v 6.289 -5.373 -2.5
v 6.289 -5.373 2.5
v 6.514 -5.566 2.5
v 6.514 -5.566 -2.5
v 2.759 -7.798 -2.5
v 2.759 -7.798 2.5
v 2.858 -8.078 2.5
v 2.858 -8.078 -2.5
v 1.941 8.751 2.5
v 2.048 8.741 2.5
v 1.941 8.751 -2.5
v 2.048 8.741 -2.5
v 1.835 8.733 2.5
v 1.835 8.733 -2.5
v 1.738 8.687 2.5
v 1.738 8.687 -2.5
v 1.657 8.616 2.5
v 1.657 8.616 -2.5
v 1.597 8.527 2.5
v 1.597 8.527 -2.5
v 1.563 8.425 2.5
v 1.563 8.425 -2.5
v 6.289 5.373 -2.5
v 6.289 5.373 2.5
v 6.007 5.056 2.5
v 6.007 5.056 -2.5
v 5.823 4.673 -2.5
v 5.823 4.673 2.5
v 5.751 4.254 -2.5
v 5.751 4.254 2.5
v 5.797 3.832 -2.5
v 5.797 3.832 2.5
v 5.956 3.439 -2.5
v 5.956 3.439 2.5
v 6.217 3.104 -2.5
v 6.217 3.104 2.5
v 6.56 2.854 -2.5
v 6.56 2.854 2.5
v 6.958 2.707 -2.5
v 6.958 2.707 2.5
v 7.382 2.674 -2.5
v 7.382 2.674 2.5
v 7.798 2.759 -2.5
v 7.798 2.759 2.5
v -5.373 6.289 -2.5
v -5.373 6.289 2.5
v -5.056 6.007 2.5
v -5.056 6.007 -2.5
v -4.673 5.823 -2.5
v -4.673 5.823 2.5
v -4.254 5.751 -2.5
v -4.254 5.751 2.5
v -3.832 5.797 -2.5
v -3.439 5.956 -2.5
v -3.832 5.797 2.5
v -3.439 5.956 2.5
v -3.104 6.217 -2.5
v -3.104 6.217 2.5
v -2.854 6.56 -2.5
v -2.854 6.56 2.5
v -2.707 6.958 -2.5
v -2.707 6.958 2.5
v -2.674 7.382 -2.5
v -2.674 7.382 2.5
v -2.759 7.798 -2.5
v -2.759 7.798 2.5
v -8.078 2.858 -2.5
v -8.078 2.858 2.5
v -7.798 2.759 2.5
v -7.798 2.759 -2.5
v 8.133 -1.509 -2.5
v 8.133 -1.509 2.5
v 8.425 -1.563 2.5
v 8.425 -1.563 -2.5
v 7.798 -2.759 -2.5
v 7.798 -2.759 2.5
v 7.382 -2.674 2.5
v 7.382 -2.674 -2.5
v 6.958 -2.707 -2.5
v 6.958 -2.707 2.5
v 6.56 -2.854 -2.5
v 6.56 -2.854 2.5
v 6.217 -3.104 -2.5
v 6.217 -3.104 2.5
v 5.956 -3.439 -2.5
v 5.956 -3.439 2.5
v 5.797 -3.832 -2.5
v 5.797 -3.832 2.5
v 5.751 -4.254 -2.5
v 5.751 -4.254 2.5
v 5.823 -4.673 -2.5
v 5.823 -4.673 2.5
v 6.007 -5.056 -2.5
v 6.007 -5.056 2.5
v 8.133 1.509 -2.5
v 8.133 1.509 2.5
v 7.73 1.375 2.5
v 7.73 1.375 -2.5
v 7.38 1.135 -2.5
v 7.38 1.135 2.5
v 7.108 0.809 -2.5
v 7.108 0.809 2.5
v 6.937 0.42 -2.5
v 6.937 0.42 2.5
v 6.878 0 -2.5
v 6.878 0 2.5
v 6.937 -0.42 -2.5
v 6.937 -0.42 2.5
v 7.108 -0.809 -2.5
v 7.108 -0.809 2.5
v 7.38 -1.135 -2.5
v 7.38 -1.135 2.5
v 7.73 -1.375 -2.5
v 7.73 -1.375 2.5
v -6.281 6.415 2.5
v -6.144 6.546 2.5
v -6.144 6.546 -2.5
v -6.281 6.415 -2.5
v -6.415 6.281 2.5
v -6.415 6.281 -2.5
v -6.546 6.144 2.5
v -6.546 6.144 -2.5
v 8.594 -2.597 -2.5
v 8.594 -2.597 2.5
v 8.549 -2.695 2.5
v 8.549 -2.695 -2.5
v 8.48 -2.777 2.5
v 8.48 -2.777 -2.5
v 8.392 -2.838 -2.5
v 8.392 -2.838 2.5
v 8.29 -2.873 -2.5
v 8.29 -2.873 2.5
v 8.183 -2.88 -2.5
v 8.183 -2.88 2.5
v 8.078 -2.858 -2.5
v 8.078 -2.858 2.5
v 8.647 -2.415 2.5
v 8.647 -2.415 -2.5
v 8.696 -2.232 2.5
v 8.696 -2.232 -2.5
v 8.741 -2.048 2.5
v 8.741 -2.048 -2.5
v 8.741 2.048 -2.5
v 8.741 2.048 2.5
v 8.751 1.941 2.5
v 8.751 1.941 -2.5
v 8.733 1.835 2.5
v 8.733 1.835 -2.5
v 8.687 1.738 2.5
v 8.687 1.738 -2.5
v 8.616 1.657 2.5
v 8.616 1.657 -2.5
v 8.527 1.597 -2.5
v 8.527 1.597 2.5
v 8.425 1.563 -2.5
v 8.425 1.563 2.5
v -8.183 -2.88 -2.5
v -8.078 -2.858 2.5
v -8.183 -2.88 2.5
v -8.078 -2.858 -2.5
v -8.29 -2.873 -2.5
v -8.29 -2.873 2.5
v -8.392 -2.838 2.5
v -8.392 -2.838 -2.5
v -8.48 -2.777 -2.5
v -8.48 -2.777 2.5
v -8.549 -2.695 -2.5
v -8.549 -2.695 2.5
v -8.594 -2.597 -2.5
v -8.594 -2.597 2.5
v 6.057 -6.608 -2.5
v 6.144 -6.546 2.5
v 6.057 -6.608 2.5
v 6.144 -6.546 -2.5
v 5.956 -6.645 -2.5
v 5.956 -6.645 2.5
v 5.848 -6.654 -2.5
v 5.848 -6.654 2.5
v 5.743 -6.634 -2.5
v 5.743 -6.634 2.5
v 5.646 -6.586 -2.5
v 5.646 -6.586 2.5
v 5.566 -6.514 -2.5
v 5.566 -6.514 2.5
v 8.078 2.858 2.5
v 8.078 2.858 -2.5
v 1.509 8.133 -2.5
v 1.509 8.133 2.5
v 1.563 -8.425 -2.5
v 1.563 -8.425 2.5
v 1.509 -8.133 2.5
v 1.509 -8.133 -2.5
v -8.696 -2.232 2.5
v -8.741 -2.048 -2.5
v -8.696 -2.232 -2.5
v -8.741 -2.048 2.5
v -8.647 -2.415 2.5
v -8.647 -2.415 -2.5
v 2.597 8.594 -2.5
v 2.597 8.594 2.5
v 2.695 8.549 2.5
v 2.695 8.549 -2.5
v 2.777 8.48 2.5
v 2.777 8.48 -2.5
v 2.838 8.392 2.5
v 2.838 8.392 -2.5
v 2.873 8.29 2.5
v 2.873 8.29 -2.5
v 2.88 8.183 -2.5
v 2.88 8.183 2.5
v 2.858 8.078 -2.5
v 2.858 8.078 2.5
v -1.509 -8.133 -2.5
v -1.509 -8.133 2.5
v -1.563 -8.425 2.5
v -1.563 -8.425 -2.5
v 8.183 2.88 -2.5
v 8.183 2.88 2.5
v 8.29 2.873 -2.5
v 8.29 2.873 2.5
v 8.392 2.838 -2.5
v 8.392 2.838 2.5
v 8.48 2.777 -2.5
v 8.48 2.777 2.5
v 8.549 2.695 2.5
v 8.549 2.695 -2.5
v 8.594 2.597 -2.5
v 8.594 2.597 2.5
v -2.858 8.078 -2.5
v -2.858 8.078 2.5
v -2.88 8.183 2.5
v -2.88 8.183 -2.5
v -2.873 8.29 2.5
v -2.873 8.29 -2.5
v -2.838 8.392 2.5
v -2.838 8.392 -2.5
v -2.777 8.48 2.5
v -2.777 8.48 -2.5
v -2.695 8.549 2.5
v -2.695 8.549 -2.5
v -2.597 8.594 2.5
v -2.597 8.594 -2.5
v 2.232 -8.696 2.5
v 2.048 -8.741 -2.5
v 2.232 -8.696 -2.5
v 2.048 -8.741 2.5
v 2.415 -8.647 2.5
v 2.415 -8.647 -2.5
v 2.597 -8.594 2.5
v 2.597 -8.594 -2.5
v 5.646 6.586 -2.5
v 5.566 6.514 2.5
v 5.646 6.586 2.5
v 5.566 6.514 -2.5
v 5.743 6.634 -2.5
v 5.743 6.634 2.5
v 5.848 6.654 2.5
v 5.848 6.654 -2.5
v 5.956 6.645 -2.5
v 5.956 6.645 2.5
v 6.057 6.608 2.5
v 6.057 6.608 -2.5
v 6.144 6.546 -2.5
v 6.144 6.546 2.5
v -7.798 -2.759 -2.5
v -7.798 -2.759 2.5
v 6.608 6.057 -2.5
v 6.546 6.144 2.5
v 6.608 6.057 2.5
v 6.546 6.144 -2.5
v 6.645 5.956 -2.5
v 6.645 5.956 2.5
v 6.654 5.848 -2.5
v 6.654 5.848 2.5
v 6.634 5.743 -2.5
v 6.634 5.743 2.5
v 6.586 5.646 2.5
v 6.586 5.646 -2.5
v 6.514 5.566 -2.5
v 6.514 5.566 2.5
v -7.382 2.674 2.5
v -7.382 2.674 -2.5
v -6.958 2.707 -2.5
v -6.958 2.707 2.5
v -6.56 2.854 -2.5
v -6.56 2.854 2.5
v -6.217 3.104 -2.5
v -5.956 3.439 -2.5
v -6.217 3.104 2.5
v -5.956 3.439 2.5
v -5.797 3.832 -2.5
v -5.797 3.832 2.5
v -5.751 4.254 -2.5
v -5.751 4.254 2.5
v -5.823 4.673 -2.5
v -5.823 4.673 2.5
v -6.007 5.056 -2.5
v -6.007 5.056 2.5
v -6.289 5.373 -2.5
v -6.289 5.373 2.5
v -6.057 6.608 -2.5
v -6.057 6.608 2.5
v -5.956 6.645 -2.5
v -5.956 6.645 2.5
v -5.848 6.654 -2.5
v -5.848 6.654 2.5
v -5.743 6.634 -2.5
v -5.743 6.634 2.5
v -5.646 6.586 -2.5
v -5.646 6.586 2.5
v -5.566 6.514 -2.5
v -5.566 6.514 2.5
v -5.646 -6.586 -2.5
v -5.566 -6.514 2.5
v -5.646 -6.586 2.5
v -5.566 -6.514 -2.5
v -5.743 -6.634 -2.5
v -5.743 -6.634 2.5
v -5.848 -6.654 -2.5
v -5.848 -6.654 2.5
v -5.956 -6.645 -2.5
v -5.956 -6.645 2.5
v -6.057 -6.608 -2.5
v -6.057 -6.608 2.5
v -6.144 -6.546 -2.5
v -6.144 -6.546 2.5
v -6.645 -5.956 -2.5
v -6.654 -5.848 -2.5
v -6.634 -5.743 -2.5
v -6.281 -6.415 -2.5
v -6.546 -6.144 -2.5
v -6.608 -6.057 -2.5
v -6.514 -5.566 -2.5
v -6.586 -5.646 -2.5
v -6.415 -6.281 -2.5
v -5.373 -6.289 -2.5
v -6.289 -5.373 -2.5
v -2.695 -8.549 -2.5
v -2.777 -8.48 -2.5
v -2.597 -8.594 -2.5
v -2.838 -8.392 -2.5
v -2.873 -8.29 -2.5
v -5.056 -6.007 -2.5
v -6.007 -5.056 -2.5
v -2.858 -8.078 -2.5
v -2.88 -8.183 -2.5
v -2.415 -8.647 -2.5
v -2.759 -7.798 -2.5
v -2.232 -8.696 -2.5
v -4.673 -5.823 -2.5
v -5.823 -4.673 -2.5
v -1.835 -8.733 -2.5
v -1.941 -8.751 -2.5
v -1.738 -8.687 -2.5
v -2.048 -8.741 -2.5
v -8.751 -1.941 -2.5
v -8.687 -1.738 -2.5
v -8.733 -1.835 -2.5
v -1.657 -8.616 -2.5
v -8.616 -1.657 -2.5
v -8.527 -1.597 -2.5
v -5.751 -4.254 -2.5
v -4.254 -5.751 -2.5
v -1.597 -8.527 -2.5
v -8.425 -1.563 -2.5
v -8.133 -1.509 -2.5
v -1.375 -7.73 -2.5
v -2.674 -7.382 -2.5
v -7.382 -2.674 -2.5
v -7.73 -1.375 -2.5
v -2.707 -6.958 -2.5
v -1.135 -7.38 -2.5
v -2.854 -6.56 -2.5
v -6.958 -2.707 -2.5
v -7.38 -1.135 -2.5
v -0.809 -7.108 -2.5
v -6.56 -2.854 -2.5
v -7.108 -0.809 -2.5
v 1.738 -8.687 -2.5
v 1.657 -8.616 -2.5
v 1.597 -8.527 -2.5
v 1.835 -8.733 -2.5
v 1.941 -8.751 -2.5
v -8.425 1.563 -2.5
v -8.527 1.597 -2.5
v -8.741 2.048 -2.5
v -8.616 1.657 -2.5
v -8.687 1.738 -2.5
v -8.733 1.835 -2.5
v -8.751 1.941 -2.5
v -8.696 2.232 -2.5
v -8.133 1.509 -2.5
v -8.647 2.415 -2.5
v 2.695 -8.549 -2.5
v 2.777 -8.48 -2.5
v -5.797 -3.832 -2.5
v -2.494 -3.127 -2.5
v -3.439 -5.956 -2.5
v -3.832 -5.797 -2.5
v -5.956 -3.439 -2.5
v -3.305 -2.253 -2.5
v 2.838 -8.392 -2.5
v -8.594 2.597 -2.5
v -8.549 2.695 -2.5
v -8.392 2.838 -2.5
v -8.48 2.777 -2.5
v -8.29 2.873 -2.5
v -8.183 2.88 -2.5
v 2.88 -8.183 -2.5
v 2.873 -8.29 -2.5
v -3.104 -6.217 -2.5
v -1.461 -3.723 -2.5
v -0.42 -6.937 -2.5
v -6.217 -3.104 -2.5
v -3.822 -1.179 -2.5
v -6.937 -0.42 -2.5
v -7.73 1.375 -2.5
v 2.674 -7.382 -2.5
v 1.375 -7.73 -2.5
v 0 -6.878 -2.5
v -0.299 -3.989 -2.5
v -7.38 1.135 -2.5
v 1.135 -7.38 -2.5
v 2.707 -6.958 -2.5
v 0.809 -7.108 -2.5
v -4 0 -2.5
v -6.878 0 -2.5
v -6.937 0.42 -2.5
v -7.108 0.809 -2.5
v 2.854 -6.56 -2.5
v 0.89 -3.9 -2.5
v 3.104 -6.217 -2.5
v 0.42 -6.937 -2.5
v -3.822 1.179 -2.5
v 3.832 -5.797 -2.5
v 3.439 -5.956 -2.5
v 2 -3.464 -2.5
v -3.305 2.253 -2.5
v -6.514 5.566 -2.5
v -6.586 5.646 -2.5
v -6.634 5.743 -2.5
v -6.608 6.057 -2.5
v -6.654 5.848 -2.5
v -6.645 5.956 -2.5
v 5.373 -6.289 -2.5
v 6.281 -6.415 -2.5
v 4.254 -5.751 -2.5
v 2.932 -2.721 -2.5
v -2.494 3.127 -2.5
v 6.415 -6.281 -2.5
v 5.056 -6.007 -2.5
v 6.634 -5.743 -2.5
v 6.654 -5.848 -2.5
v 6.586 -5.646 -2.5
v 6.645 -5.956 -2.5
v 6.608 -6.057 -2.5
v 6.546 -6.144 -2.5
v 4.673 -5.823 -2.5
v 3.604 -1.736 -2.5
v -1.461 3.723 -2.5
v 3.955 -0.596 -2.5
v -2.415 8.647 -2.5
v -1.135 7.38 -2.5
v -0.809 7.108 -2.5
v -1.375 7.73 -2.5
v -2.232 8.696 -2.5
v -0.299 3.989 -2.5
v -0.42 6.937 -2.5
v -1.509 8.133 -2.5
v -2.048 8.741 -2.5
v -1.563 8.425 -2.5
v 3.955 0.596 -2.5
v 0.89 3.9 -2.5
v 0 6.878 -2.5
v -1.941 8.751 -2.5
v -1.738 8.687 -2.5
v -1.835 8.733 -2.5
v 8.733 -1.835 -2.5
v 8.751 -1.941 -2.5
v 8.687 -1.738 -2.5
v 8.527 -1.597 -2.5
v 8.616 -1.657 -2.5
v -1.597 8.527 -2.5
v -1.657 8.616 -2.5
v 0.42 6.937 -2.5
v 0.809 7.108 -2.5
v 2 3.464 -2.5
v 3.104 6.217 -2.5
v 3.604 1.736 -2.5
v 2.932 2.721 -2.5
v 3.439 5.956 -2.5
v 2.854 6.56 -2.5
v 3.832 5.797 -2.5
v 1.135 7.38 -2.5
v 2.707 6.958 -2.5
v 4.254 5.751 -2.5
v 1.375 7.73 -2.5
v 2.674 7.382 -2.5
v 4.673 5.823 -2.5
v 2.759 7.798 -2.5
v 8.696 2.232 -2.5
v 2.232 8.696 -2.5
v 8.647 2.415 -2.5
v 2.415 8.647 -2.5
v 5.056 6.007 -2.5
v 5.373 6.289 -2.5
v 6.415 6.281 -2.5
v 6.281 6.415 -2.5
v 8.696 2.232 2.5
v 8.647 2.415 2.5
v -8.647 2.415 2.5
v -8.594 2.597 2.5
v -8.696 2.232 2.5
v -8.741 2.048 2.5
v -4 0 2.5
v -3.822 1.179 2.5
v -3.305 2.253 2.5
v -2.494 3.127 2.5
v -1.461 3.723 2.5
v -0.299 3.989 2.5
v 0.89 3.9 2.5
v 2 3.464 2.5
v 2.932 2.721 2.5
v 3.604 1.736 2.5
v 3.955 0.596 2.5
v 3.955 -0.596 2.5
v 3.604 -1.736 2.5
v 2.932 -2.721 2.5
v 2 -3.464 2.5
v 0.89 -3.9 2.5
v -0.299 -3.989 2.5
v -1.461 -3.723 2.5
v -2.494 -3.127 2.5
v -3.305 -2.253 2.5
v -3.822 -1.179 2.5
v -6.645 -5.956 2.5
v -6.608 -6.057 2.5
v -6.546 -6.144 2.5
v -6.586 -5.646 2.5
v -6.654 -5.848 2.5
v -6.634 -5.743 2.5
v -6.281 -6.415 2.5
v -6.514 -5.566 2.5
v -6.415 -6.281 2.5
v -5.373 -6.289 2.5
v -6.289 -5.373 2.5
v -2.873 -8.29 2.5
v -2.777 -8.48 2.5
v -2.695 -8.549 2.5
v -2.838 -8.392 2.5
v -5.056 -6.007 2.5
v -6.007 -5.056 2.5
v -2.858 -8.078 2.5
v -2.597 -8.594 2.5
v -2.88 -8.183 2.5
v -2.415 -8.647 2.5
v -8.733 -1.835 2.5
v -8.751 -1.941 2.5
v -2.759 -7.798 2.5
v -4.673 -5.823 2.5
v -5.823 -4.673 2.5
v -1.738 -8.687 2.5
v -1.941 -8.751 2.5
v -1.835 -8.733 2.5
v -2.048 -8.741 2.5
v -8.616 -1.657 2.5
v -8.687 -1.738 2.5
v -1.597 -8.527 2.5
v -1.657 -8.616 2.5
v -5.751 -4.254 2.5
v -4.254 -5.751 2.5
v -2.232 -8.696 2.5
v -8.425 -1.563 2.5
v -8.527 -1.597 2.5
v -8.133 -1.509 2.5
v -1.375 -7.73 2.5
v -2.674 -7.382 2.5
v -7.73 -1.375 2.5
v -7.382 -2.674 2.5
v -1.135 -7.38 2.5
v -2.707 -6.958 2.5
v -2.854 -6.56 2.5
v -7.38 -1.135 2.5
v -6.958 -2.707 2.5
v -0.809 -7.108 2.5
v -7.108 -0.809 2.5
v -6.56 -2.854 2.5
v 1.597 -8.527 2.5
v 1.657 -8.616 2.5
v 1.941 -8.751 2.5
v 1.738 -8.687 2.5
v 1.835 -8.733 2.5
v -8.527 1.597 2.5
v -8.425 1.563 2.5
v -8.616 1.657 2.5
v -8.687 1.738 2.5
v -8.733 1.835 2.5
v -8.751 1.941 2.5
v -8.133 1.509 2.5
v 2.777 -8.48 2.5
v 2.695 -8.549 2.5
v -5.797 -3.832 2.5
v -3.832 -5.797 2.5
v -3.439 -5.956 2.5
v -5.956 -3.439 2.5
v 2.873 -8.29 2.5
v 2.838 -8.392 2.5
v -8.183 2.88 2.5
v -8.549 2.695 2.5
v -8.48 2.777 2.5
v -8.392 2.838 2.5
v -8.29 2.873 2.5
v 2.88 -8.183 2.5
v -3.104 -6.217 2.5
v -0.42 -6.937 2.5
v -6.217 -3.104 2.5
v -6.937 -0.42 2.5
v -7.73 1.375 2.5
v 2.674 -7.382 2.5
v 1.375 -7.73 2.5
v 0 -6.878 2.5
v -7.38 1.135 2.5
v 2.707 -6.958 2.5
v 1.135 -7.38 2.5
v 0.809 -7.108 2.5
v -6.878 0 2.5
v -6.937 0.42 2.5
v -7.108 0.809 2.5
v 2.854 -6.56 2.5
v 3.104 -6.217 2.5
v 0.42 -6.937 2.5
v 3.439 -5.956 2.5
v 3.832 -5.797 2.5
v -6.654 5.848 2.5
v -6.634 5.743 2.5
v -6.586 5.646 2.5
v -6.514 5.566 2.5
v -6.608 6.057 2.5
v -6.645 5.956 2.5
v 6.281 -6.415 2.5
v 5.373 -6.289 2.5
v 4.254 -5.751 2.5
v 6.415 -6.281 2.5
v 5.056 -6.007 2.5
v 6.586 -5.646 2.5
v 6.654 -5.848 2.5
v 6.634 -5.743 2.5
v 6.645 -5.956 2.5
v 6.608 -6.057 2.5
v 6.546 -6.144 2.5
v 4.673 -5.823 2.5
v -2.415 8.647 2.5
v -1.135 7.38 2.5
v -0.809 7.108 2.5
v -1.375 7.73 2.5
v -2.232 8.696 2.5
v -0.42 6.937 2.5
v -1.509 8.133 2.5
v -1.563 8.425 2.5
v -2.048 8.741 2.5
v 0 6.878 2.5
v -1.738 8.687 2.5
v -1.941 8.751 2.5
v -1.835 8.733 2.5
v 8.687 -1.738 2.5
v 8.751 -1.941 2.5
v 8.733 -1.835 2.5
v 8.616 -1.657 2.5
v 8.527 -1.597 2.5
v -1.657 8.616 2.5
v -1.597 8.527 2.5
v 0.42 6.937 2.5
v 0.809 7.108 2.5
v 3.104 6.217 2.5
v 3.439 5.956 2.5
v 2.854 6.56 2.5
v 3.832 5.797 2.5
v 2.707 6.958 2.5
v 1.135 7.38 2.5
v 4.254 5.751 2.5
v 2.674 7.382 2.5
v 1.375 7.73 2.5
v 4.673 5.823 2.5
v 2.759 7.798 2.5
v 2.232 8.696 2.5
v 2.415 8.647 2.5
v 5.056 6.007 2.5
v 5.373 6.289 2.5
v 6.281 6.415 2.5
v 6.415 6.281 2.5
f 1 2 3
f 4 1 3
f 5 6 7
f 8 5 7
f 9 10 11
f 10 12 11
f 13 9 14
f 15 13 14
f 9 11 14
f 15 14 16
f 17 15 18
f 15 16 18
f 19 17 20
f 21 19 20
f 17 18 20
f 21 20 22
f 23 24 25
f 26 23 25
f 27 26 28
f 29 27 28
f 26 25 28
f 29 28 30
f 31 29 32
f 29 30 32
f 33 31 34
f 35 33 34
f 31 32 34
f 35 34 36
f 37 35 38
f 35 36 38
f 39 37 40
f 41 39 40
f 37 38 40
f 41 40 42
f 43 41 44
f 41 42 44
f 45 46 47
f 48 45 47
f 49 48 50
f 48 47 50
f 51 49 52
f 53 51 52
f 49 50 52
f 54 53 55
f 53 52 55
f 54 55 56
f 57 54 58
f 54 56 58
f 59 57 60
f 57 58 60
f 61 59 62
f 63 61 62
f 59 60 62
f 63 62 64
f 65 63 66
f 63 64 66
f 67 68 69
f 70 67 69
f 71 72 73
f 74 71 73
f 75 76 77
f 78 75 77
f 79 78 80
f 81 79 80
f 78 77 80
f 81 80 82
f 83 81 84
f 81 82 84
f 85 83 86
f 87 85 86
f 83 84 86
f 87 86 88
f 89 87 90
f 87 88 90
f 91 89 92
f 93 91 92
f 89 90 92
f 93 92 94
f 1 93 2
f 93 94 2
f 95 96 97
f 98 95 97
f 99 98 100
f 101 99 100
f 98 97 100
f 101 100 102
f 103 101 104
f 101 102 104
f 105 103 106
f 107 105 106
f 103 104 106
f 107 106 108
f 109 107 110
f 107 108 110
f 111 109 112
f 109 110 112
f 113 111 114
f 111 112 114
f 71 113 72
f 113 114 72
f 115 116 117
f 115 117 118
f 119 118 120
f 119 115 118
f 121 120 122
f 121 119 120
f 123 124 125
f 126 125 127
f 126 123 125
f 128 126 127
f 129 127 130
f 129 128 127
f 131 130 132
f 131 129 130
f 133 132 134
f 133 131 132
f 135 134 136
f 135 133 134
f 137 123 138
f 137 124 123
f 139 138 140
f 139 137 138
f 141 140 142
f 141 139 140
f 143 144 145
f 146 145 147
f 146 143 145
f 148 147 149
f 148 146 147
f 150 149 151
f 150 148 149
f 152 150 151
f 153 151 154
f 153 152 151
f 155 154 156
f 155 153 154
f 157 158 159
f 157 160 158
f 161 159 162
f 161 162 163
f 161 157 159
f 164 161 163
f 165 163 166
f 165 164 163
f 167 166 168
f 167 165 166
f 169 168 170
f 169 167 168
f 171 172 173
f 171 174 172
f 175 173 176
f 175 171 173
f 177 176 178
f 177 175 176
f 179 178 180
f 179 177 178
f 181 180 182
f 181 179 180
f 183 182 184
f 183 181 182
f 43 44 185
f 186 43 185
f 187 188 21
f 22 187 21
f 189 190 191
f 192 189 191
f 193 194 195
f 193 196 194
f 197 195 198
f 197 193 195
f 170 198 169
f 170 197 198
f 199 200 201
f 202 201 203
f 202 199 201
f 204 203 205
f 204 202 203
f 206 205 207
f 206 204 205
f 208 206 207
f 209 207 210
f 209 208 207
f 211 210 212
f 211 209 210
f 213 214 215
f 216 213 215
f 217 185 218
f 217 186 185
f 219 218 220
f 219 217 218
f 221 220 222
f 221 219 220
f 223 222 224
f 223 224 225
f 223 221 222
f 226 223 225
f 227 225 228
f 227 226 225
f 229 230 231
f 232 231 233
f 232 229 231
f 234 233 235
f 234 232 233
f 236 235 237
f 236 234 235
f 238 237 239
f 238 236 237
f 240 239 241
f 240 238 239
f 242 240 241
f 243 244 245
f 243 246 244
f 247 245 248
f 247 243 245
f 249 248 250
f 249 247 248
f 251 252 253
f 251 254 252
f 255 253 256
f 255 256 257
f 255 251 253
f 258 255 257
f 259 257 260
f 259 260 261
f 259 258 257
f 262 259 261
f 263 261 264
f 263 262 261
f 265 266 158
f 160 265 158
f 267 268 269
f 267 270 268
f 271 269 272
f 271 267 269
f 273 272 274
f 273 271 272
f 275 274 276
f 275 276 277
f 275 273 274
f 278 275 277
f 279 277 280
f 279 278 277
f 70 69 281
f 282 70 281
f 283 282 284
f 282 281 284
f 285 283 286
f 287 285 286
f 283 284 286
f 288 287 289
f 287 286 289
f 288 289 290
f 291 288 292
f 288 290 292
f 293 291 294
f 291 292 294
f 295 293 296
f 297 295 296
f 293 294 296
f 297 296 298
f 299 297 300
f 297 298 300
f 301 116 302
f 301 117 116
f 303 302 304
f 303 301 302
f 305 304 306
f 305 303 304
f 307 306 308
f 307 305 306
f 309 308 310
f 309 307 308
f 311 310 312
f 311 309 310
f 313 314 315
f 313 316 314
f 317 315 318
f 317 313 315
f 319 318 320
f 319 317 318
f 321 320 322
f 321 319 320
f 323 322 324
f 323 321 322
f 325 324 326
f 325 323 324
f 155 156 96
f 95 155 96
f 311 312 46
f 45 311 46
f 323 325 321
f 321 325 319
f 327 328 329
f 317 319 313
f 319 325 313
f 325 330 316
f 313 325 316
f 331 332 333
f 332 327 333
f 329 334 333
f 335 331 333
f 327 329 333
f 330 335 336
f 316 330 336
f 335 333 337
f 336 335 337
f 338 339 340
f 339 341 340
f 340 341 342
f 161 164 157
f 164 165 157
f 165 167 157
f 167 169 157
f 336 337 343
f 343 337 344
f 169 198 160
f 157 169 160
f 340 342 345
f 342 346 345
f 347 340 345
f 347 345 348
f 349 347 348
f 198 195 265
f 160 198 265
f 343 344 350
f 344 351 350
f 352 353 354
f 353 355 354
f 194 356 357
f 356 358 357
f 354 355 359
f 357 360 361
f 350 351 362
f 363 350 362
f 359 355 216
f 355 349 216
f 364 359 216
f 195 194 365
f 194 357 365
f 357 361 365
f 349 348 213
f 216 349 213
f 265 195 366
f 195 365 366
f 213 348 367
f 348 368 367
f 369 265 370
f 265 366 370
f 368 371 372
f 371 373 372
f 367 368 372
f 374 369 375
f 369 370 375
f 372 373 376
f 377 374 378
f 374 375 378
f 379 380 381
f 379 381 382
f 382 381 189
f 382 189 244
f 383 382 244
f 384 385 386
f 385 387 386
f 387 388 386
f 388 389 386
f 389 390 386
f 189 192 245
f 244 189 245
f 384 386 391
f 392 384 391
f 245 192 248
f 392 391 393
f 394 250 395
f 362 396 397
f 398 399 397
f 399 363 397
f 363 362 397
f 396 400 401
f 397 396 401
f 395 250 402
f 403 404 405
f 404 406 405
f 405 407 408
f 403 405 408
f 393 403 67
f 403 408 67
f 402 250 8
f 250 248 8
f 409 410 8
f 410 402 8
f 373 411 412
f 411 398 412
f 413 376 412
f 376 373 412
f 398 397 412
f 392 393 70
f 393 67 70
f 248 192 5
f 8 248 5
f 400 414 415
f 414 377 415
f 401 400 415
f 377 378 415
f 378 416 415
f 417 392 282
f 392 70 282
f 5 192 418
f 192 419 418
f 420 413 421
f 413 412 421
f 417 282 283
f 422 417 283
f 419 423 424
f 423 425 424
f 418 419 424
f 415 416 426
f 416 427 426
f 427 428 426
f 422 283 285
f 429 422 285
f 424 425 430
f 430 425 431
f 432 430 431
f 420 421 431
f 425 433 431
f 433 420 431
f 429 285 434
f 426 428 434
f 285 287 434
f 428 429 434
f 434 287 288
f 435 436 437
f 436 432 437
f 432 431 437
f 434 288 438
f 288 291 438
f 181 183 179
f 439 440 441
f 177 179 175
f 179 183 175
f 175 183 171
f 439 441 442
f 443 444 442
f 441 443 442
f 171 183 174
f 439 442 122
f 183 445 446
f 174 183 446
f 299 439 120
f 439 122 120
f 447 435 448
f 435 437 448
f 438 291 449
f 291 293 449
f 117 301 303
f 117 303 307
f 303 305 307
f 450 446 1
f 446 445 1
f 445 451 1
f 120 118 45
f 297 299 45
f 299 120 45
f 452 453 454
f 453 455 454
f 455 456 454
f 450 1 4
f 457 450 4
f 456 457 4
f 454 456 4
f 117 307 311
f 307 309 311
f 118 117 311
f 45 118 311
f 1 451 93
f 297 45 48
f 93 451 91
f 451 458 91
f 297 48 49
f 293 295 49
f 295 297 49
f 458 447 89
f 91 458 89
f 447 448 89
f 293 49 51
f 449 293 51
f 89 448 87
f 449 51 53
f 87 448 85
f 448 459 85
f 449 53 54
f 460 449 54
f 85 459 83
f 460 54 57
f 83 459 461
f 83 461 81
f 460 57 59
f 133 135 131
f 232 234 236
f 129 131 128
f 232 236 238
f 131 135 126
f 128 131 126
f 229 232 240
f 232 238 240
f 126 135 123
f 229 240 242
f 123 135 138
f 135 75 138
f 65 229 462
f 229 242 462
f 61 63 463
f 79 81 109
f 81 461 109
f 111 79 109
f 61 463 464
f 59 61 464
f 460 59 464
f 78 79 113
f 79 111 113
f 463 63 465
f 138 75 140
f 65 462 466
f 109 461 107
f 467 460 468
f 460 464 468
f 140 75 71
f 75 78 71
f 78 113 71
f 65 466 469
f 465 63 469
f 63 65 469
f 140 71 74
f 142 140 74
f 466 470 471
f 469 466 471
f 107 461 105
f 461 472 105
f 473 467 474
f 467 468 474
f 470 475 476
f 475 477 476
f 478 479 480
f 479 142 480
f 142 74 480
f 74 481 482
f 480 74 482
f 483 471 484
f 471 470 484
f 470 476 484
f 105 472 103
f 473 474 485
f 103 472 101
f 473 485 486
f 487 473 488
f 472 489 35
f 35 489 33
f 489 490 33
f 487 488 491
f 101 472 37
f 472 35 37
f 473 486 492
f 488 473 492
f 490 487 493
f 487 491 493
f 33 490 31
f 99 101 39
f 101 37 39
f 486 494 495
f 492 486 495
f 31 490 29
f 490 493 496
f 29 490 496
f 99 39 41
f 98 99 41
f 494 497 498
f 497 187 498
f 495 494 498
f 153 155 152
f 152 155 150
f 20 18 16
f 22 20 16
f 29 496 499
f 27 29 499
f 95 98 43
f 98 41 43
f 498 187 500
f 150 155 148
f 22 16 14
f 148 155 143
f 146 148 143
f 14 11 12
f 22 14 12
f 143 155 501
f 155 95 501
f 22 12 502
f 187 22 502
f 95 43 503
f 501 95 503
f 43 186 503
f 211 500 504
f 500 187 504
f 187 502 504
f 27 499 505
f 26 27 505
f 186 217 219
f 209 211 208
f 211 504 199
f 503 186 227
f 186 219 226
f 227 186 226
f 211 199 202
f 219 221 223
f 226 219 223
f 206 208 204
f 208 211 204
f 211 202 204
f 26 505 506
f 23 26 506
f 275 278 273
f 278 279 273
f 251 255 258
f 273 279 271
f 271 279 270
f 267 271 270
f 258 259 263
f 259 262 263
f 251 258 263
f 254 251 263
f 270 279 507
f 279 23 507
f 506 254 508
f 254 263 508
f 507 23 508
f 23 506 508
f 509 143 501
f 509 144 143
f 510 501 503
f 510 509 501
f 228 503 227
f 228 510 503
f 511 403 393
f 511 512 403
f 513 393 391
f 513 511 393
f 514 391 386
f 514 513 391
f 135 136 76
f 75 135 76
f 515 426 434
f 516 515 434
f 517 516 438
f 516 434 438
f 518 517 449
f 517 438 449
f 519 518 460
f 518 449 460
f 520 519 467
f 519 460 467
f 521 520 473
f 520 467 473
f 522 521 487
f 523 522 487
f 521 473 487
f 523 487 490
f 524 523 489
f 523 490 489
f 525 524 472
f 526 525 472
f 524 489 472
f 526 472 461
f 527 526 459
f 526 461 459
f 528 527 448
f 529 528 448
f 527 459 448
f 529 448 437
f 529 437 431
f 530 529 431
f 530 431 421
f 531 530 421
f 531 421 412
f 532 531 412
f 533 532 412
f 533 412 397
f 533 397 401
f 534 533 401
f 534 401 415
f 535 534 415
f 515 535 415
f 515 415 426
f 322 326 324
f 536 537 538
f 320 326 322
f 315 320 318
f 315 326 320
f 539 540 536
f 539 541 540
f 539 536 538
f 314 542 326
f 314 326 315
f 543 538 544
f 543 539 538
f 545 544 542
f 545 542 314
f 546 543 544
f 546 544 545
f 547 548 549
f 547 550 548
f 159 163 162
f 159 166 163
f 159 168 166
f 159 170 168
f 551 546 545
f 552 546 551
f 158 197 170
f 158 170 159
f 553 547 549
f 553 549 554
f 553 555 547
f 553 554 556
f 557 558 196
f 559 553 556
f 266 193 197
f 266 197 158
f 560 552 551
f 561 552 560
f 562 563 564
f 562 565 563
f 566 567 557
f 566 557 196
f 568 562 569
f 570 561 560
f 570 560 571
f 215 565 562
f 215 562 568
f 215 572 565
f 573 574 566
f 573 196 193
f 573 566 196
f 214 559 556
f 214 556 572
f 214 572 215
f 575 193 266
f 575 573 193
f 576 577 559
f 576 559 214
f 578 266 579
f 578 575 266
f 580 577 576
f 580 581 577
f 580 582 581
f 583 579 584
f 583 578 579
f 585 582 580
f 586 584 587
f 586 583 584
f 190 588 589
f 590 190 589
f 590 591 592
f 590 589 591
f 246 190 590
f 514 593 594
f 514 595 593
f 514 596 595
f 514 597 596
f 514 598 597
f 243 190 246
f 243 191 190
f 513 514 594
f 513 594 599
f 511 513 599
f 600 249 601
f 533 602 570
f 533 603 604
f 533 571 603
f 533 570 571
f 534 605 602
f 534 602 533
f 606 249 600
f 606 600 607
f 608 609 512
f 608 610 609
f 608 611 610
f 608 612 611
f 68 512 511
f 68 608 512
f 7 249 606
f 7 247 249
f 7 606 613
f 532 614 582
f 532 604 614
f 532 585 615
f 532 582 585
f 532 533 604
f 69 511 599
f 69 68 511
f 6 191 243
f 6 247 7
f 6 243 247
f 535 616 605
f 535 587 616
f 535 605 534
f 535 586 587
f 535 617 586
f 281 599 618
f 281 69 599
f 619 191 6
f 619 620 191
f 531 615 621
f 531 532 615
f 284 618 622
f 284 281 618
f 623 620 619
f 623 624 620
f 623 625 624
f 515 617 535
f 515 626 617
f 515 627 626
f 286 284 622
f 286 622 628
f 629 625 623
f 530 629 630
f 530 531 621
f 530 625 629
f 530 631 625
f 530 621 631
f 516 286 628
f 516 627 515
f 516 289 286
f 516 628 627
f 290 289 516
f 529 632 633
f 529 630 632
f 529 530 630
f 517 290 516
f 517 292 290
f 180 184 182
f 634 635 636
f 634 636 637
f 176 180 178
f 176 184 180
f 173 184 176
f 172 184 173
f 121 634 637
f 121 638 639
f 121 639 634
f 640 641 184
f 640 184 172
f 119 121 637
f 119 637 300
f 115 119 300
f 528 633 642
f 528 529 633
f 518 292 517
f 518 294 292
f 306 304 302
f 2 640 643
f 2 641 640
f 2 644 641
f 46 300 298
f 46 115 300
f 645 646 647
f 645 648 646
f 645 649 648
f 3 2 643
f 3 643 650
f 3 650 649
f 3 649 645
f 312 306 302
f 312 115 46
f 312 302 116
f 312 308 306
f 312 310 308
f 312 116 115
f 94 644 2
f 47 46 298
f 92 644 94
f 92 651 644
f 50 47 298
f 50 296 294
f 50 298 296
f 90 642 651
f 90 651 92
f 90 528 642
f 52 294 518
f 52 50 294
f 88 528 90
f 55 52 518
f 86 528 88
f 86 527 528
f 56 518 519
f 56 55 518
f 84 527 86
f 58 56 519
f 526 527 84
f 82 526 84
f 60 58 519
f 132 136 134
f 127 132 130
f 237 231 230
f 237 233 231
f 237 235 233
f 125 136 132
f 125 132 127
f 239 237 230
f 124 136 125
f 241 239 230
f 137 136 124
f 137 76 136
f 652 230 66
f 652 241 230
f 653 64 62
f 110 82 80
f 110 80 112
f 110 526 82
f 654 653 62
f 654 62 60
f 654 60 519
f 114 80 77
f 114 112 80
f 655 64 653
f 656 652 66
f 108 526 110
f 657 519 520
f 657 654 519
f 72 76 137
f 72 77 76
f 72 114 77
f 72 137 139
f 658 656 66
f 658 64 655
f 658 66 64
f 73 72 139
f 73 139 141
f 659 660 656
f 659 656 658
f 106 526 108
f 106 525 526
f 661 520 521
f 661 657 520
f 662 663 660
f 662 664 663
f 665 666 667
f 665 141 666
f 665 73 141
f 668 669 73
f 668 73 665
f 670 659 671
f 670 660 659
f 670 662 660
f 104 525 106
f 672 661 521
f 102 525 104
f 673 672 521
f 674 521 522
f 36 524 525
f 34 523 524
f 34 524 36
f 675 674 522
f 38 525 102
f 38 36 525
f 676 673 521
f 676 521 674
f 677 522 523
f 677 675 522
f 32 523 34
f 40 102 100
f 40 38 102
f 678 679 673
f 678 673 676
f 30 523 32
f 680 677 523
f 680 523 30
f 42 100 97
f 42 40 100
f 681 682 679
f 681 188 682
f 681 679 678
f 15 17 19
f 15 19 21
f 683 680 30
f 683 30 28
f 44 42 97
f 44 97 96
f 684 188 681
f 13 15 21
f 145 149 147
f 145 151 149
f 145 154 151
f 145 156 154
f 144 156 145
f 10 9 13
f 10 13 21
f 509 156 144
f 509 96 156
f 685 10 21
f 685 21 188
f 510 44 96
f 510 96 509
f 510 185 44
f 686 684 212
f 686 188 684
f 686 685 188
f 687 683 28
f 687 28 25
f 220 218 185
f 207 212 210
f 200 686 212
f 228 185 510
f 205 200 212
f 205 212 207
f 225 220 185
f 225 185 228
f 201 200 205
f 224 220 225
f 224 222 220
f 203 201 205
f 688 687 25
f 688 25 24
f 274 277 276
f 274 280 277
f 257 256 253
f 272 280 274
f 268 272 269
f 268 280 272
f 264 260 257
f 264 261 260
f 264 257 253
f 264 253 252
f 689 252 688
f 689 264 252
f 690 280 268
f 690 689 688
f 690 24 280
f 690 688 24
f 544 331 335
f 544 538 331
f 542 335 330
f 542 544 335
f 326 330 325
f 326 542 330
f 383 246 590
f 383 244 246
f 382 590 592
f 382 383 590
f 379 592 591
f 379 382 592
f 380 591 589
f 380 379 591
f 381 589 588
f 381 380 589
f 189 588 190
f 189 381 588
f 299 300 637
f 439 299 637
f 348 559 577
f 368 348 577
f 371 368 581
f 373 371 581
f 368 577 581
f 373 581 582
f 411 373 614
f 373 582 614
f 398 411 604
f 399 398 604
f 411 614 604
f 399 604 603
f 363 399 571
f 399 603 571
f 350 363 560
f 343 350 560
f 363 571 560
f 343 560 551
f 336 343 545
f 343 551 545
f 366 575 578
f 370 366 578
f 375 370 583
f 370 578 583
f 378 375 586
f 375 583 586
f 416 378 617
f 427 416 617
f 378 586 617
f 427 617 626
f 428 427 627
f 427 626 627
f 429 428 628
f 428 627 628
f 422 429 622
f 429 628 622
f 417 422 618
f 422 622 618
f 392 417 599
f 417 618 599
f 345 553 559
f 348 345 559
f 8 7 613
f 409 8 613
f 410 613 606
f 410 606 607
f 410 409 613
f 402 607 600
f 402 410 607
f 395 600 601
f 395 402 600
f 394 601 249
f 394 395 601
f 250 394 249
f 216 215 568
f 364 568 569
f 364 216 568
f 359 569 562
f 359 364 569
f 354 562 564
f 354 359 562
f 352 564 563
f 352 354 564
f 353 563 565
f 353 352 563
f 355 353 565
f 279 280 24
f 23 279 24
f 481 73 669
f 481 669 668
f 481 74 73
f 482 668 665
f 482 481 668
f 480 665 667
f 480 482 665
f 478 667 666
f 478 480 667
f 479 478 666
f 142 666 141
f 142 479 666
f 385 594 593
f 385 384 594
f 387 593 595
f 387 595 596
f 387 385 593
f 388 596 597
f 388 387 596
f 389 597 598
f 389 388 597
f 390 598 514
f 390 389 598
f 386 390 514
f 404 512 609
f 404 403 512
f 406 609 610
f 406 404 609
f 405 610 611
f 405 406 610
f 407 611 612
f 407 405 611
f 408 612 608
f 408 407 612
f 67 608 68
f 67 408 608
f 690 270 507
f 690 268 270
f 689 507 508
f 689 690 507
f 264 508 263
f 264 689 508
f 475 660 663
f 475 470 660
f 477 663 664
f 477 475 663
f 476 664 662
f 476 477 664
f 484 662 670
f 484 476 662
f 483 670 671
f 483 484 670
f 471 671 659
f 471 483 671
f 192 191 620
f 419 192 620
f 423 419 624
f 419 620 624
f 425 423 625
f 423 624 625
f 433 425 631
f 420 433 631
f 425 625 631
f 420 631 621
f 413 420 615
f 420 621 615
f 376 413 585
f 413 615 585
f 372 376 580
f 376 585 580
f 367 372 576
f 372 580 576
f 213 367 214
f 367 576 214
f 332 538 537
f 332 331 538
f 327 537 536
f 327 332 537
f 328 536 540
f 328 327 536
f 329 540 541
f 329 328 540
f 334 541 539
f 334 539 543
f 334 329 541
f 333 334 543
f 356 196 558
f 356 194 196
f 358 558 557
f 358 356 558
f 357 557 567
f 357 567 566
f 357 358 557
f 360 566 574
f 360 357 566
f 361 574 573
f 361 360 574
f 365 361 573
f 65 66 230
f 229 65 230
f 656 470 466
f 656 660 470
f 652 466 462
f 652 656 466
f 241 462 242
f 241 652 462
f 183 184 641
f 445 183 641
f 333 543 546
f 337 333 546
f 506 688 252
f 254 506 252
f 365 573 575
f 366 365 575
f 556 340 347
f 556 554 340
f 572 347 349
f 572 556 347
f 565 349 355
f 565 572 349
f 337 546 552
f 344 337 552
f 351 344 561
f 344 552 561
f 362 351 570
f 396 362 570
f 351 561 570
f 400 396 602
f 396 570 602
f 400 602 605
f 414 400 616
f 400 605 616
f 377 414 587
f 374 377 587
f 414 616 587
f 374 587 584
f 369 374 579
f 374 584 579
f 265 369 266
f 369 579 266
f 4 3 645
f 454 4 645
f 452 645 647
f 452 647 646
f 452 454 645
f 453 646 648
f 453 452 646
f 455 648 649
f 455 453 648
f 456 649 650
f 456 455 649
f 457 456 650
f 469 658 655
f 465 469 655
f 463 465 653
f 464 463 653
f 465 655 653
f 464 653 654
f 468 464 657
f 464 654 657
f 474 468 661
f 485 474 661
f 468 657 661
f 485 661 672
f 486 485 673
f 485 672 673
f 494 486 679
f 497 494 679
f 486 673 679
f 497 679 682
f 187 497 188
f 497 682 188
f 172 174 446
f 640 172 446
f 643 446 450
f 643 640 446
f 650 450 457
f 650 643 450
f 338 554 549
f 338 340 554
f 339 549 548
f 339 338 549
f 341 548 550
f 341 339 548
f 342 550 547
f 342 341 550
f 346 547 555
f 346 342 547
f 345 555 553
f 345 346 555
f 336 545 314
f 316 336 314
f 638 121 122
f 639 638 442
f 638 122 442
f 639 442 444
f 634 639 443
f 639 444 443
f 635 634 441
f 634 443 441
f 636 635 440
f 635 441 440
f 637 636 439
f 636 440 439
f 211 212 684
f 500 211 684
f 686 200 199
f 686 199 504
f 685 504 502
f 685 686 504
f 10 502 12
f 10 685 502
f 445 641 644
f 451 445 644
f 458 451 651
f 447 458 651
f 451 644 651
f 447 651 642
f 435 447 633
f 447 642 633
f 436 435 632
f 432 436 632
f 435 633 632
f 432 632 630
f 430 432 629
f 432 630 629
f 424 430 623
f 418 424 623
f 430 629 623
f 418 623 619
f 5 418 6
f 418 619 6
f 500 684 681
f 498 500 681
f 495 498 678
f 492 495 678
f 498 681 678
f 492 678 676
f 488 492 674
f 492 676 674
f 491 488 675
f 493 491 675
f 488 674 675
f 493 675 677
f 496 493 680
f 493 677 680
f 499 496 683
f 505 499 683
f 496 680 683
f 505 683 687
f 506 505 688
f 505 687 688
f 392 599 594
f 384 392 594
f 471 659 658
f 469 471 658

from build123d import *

# Parameters (mm, degrees)
SKETCH_3_R                       = 8.977796586
EXTRUDE_2_DEPTH                  = 2.5
CUT_EXTRUDE_2_DEPTH              = 13.940311552
FILLET_1_R                       = 0.4
PATTERN_CIRCULAR_1_COUNT         = 12
FILLET_1_OF_PATTERN_CIRCULAR_1_R = 0.4
SKETCH_4_R                       = 4
CUT_EXTRUDE_3_DEPTH              = 14.348503998


with BuildPart() as part:
    # 스케치3 → 보스-돌출2 (new, symmetric)
    with BuildSketch(Plane.XY):
        Circle(SKETCH_3_R)
    extrude(amount=EXTRUDE_2_DEPTH, both=True)

    # 스케치3<3> → 컷-돌출2 (cut, symmetric)
    with BuildSketch(Plane.XY):
        with BuildLine():
            Line((-1.638089976, 8.827088578), (-1.509232342, 8.132720278))
            ThreePointArc((-1.509232342, 8.132720278), (0, 6.877796586), (1.509232342, 8.132720278))
            Line((1.509232342, 8.132720278), (1.638089976, 8.827088578))
            ThreePointArc((1.638089976, 8.827088578), (0, 8.977796586), (-1.638089976, 8.827088578))
        make_face()
    cut_extrude_2 = extrude(amount=CUT_EXTRUDE_2_DEPTH, both=True, mode=Mode.SUBTRACT)

    # 필렛1
    fillet_1_edges = [part.edges().sort_by_distance(p)[0] for p in [
        (1.638089976, 8.827088578, 0),
        (-1.638089976, 8.827088578, 0),
    ]]
    fillet(fillet_1_edges, radius=FILLET_1_R)

    # 원형 패턴1: 컷-돌출2 ×12 about axis
    pattern_circular_1_axis = Axis((0, 0, 2.5), (0, 0, -1))
    for i in range(1, PATTERN_CIRCULAR_1_COUNT):
        add(cut_extrude_2.rotate(pattern_circular_1_axis, i * 360 / PATTERN_CIRCULAR_1_COUNT), mode=Mode.SUBTRACT)

    # 필렛1 of 원형 패턴1
    fillet_1_of_pattern_circular_1_edges = [part.edges().sort_by_distance(p)[0] for p in [
        (5.832171822, 6.825437962, 0),
        (2.994916756, 8.463527938, 0),
        (8.463527938, 2.994916756, 0),
        (6.825437962, 5.832171822, 0),
        (8.827088578, -1.638089976, 0),
        (8.827088578, 1.638089976, 0),
        (6.825437962, -5.832171822, 0),
        (8.463527938, -2.994916756, 0),
        (2.994916756, -8.463527938, 0),
        (5.832171822, -6.825437962, 0),
        (-1.638089976, -8.827088578, 0),
        (1.638089976, -8.827088578, 0),
        (-5.832171822, -6.825437962, 0),
        (-2.994916756, -8.463527938, 0),
        (-8.463527938, -2.994916756, 0),
        (-6.825437962, -5.832171822, 0),
        (-8.827088578, 1.638089976, 0),
        (-8.827088578, -1.638089976, 0),
        (-6.825437962, 5.832171822, 0),
        (-8.463527938, 2.994916756, 0),
        (-2.994916756, 8.463527938, 0),
        (-5.832171822, 6.825437962, 0),
    ]]
    fillet(fillet_1_of_pattern_circular_1_edges, radius=FILLET_1_OF_PATTERN_CIRCULAR_1_R)

    # 스케치4 → 컷-돌출3 (cut, through all)
    with BuildSketch(Plane(origin=(0, 0, -2.5), x_dir=(-1, 0, 0), z_dir=(0, 0, -1))):
        Circle(SKETCH_4_R)
    extrude(amount=-CUT_EXTRUDE_3_DEPTH, mode=Mode.SUBTRACT)


solid = part.part
